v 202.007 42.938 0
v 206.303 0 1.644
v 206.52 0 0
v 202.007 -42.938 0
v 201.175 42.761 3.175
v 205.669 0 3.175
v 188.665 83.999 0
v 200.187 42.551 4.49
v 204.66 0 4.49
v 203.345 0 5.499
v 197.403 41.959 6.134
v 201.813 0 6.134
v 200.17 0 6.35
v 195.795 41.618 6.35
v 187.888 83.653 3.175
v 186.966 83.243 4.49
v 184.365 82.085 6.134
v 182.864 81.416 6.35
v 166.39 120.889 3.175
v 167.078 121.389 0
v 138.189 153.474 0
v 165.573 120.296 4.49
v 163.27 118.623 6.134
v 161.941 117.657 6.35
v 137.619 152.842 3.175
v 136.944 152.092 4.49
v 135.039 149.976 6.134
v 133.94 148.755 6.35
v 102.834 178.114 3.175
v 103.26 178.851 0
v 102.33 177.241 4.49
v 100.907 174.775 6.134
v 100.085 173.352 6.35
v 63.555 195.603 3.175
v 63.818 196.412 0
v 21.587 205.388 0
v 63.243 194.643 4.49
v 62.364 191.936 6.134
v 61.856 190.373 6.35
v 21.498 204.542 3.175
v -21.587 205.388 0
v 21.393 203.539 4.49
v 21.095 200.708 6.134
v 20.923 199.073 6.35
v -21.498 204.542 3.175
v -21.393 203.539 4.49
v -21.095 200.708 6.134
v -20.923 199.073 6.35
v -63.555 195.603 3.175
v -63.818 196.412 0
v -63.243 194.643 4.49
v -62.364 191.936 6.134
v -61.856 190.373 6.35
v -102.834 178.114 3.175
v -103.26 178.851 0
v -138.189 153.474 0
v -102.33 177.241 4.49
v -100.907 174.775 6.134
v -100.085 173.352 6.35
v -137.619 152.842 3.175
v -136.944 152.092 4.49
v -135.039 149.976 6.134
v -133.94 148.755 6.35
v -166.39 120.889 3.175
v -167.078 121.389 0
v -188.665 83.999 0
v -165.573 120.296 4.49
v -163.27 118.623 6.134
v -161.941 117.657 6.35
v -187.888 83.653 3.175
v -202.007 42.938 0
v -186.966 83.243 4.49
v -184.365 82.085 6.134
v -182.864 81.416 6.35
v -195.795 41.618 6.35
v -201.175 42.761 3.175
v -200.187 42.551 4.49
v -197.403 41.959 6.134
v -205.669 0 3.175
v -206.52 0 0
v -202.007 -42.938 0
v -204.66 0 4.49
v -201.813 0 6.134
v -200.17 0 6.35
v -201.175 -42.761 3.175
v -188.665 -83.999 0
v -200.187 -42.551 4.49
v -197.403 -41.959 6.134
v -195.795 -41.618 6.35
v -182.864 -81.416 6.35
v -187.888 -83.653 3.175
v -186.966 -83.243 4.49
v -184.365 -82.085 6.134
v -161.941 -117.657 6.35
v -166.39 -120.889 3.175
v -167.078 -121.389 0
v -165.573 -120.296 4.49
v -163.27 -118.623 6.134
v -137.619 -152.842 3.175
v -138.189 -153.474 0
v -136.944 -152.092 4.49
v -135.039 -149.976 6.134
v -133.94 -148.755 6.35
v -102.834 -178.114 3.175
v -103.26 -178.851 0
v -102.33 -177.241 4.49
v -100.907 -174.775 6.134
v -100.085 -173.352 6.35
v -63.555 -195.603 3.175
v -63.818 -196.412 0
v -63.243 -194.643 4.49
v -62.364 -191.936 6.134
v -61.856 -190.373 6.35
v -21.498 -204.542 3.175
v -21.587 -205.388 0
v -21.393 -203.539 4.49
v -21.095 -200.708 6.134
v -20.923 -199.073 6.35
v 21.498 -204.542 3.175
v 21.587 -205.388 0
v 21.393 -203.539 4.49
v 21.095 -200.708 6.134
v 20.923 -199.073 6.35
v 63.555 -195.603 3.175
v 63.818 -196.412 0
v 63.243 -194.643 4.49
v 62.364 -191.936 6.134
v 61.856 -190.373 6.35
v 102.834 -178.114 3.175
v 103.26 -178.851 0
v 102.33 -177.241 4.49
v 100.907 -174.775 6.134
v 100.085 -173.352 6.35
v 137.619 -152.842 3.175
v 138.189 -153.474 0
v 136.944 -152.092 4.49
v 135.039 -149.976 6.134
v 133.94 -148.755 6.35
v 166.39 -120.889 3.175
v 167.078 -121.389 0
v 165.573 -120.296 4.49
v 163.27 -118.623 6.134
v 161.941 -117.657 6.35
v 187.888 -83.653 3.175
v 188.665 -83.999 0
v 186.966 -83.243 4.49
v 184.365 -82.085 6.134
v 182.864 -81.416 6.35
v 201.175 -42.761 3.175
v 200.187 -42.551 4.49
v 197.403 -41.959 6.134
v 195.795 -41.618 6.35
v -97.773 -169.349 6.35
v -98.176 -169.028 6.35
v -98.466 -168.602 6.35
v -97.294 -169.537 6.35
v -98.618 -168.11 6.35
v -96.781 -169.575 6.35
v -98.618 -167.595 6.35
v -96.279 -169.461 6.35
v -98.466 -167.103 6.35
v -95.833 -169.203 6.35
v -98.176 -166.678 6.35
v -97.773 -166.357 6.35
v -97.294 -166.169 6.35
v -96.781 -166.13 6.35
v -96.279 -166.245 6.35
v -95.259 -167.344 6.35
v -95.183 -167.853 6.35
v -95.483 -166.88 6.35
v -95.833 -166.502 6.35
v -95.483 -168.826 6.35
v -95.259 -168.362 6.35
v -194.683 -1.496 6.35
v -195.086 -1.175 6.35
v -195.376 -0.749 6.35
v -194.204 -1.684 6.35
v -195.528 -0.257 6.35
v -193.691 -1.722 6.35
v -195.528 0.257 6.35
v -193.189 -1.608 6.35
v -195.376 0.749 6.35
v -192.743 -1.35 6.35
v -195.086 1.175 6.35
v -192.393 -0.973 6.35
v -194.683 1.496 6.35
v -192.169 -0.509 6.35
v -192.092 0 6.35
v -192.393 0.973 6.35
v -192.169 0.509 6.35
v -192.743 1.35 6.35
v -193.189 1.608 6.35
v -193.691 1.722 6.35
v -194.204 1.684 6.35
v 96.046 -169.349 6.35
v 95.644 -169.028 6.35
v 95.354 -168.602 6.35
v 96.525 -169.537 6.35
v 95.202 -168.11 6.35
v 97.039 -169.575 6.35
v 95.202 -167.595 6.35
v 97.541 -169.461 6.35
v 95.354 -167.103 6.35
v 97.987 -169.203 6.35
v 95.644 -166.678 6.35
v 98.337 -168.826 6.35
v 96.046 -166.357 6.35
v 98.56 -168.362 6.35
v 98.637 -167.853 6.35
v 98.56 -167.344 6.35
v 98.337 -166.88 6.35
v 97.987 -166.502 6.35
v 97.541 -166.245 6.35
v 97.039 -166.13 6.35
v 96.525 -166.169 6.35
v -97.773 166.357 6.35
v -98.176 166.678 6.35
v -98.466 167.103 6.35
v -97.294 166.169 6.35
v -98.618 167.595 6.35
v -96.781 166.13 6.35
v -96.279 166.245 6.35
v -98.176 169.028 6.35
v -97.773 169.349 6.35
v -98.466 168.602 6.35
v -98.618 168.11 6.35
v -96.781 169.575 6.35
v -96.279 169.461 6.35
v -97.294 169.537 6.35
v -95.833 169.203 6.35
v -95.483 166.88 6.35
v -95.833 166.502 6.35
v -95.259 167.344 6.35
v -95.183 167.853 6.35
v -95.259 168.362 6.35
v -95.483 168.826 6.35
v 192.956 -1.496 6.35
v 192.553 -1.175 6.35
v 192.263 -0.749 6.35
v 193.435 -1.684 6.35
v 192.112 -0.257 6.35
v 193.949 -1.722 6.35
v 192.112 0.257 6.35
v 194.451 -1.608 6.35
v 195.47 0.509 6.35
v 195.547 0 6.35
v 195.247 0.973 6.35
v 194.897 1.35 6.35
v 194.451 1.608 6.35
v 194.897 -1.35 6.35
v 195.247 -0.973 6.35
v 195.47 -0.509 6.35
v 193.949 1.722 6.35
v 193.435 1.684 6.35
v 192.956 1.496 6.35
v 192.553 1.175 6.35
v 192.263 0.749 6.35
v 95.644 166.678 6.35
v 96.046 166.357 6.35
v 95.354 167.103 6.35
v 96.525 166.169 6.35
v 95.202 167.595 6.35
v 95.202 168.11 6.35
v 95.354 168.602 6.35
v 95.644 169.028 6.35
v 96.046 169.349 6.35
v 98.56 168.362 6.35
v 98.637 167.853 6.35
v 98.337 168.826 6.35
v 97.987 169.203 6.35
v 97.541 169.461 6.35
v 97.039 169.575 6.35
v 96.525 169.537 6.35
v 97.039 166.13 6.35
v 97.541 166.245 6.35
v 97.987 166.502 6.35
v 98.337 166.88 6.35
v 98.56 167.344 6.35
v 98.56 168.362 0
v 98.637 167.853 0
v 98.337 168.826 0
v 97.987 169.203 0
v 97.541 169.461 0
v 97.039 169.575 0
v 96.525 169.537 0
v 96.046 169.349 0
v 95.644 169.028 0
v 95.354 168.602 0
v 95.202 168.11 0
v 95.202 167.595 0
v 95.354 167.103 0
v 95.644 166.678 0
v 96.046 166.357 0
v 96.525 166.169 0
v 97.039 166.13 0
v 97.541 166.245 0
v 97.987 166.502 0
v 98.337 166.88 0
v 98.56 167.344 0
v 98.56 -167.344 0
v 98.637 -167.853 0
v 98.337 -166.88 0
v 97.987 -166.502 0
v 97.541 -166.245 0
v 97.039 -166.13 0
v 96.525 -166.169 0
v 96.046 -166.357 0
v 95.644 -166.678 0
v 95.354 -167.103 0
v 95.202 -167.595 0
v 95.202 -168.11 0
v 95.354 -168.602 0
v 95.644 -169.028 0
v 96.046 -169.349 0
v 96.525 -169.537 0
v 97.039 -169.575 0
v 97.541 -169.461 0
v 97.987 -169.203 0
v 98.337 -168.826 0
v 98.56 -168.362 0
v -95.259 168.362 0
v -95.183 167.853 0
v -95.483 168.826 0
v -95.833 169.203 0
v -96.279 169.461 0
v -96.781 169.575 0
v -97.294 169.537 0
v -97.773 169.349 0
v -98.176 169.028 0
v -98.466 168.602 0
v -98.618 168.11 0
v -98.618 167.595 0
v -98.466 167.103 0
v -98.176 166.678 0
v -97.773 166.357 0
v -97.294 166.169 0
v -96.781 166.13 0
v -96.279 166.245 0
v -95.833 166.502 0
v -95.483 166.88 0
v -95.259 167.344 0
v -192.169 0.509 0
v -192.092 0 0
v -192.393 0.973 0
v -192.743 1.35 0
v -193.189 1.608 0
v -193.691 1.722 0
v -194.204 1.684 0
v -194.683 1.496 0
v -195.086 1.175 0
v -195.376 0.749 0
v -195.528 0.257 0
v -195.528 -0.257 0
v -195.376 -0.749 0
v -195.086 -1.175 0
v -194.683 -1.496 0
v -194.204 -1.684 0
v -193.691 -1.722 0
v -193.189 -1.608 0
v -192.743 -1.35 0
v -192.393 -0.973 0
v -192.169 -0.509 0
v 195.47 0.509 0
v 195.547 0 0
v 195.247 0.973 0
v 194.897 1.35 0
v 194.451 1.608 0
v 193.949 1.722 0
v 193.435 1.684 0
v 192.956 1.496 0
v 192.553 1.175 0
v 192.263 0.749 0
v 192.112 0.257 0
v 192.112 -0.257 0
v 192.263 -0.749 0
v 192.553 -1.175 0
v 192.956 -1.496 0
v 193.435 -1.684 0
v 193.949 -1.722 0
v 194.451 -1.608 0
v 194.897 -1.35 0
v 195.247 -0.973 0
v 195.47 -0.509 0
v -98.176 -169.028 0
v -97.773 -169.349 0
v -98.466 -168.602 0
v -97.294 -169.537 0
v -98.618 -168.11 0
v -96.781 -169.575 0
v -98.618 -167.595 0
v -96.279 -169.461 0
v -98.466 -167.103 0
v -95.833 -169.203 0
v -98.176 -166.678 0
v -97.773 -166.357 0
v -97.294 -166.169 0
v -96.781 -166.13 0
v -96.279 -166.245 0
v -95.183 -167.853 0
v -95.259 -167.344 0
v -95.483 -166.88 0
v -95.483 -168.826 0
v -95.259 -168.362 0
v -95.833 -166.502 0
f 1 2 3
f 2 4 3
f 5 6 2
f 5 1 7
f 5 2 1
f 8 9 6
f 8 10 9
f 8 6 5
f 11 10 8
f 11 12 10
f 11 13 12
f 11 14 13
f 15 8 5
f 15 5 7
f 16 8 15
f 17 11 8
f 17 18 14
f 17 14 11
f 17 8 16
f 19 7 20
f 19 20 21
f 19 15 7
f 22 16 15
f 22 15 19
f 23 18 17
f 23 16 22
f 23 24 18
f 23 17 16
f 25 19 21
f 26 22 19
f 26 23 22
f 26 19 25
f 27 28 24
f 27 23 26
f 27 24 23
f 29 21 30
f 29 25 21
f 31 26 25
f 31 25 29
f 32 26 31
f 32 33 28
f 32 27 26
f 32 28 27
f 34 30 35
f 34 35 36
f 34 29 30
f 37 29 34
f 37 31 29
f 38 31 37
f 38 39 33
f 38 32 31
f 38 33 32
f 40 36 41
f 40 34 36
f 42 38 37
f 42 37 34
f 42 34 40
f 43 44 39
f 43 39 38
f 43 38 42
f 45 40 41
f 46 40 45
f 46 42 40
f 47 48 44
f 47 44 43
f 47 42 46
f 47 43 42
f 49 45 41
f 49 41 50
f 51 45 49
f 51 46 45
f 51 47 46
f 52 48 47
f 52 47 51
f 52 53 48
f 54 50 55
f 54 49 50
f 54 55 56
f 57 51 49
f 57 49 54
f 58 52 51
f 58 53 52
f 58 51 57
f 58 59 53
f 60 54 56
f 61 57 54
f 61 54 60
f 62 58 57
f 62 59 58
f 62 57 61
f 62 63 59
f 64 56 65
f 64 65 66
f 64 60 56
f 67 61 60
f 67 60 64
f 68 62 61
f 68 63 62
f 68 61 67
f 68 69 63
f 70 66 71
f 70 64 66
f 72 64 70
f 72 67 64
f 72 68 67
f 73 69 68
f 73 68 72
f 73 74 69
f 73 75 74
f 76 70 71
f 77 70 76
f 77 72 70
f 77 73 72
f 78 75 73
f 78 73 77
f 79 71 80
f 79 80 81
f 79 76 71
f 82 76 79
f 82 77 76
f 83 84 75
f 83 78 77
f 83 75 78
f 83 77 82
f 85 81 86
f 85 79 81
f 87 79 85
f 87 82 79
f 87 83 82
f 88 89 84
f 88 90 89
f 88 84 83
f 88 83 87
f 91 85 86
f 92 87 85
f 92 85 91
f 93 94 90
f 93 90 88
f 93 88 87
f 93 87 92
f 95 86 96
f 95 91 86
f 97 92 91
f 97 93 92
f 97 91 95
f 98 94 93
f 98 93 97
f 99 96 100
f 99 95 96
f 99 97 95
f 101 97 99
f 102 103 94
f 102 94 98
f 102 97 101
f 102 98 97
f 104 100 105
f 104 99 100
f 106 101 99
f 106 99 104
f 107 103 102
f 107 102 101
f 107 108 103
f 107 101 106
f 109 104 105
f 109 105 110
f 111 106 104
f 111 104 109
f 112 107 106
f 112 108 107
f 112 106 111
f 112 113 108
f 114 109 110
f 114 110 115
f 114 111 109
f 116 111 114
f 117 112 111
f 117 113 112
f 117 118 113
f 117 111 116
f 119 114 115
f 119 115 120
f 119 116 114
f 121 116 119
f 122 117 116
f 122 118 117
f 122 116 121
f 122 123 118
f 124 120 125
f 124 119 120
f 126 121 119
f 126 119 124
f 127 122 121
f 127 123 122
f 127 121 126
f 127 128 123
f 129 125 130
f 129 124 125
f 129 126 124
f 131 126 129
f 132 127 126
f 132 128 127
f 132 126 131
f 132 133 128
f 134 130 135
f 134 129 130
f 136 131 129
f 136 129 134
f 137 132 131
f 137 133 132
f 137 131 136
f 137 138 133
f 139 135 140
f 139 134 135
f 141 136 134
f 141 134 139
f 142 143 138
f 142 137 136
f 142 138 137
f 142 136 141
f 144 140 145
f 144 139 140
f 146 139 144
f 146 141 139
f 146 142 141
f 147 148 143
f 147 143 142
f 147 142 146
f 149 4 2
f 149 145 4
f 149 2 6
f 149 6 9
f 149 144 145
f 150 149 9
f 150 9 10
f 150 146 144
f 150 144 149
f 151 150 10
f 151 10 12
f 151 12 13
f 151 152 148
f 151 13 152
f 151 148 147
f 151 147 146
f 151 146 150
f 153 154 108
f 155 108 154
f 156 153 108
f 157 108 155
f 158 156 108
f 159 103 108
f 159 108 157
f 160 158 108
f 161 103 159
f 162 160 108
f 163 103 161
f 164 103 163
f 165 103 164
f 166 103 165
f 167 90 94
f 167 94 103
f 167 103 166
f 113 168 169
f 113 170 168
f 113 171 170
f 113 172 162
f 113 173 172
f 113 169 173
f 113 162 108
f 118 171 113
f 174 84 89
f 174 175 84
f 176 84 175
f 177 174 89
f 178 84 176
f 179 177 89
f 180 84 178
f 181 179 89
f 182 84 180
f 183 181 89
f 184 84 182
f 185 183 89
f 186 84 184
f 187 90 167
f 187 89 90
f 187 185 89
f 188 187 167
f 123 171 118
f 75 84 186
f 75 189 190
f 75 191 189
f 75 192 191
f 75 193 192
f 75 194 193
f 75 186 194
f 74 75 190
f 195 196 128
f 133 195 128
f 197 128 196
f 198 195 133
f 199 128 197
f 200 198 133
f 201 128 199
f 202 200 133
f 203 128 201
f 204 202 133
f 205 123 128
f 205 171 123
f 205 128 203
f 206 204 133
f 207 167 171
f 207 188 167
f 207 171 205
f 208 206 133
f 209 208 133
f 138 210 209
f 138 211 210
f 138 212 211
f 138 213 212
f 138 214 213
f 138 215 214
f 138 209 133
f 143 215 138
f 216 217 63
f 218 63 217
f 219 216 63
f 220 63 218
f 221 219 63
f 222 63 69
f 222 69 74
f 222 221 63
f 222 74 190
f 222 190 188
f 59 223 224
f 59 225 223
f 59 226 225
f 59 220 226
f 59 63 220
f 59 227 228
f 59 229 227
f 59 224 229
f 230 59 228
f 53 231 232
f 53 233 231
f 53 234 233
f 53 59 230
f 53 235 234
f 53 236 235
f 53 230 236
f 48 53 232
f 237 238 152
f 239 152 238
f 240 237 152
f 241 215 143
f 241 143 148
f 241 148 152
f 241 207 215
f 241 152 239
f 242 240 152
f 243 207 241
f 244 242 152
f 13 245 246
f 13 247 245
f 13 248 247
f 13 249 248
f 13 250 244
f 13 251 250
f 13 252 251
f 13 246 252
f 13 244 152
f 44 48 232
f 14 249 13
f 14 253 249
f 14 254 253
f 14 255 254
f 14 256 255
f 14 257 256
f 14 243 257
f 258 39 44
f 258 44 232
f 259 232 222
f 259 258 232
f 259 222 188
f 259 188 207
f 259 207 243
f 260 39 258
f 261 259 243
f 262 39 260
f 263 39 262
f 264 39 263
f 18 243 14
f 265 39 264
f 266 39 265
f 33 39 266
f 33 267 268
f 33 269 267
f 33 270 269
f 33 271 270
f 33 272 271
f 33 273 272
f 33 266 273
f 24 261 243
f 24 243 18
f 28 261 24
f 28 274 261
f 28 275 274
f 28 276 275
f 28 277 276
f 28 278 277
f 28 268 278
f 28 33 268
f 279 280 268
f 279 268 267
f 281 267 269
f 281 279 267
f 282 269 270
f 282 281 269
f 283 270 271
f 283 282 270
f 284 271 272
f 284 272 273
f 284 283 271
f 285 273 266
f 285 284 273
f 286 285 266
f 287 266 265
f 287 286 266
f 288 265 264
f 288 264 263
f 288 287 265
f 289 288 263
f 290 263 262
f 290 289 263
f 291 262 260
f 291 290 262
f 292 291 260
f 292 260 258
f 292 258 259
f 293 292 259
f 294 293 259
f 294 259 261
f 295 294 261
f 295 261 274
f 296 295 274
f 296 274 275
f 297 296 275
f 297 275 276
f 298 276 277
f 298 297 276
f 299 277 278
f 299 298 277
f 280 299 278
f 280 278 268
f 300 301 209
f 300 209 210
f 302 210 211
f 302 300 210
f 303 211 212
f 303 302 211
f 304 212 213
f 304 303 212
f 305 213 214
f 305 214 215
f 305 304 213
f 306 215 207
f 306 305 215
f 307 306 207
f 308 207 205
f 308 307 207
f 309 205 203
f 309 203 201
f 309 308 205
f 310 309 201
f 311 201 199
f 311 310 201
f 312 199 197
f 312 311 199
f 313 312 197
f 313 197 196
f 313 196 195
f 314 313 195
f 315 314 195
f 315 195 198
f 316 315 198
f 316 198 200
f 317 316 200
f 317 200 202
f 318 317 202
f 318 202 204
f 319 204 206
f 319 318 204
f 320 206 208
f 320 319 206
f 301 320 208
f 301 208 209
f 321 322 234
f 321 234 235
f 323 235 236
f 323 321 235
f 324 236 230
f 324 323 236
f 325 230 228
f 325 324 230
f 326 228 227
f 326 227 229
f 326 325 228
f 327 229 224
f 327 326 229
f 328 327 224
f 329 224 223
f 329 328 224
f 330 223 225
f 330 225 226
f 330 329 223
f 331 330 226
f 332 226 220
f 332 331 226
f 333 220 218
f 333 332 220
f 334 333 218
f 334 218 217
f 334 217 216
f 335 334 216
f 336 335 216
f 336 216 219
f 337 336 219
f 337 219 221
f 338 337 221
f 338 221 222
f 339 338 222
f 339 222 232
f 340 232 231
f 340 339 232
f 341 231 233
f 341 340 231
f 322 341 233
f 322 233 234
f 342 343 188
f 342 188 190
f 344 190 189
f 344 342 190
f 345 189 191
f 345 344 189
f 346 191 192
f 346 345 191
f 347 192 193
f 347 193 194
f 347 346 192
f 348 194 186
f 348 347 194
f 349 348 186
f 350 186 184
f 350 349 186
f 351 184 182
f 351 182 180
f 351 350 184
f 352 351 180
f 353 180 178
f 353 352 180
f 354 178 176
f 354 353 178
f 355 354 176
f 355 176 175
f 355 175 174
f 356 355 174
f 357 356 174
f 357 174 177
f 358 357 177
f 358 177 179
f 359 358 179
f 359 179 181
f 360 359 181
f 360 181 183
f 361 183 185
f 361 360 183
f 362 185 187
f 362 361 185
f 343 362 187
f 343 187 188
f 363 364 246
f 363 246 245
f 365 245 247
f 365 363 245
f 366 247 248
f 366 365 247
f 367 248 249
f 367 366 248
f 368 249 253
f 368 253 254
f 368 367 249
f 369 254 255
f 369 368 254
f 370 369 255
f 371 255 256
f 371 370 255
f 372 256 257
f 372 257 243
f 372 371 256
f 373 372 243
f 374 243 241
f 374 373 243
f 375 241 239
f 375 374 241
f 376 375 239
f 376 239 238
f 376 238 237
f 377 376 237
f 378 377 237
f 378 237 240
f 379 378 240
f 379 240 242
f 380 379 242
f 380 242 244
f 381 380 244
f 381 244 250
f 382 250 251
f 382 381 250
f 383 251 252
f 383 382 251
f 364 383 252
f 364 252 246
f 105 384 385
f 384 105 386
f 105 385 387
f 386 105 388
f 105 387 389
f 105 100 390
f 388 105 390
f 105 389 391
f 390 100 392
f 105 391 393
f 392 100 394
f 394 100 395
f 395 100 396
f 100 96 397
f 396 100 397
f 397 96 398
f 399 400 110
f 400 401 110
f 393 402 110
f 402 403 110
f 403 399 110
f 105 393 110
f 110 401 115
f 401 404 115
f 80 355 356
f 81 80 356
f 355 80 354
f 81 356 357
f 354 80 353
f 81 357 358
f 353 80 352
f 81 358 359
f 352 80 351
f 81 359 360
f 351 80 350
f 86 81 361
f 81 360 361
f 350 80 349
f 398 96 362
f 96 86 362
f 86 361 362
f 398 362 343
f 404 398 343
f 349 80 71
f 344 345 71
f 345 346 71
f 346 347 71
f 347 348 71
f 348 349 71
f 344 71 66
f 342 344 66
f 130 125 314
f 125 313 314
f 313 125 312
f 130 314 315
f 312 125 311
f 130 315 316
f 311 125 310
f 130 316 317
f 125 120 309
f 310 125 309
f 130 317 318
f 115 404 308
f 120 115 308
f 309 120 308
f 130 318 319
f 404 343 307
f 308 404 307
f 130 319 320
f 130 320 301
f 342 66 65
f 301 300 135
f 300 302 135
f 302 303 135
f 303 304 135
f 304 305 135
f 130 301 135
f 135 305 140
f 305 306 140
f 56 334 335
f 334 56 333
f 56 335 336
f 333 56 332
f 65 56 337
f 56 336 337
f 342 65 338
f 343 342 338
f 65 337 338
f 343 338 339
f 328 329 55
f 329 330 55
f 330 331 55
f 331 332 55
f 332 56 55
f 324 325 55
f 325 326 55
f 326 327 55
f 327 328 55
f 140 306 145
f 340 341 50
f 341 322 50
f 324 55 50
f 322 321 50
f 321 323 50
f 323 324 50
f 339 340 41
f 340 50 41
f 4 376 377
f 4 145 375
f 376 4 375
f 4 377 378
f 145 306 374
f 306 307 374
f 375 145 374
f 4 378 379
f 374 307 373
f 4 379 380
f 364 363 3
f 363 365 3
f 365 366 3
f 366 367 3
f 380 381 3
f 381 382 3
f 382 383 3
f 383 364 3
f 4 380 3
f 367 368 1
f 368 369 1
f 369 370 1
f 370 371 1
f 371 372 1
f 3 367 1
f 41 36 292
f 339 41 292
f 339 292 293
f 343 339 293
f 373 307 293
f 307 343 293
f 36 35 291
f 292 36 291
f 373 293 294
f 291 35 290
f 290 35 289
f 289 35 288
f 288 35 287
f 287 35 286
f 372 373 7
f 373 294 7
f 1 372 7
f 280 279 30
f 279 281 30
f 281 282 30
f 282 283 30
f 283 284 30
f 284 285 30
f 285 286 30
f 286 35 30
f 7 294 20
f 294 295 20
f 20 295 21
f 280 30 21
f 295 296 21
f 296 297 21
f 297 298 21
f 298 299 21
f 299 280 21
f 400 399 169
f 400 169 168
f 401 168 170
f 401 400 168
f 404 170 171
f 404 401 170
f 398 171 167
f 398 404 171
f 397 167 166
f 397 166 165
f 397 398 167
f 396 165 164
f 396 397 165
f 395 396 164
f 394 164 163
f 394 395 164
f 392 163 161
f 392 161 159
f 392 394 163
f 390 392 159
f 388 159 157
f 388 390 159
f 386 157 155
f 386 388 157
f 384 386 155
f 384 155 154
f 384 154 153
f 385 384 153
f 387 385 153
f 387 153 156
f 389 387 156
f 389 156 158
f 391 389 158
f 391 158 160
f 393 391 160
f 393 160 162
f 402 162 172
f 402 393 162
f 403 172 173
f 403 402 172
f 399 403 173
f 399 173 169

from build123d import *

# Parameters (mm, degrees)
F0_R     = 206.5196172612
F0_R_2   = 1.7272
F1_DEPTH = 6.35
F2_R     = 6.34999


# Not quite as in the source:
# - a fillet or chamfer is up to 0.001 mm smaller than in the source, because OpenCascade refuses the exact size


with BuildPart() as f1:
    # F0 (on Top) → F1 (new body)
    with BuildSketch(Plane.XY):
        Circle(F0_R)
        with Locations((-96.9098086306, -167.8527123)):
            Circle(F0_R_2, mode=Mode.SUBTRACT)
        with Locations((96.9098086306, -167.8527123)):
            Circle(F0_R_2, mode=Mode.SUBTRACT)
        with Locations((-193.8196172612, 0)):
            Circle(F0_R_2, mode=Mode.SUBTRACT)
        with Locations((-96.9098086306, 167.8527123)):
            Circle(F0_R_2, mode=Mode.SUBTRACT)
        with Locations((193.8196172612, 0)):
            Circle(F0_R_2, mode=Mode.SUBTRACT)
        with Locations((96.9098086306, 167.8527123)):
            Circle(F0_R_2, mode=Mode.SUBTRACT)
    extrude(amount=F1_DEPTH)

    # F2 (radius 6.35 in the source; OpenCascade refuses exactly that, so slightly less here)
    f2_edges = [f1.edges().sort_by_distance(p)[0] for p in [
        (-206.519617, 0, 6.35),
    ]]
    fillet(f2_edges, radius=F2_R)


solid = f1.part
